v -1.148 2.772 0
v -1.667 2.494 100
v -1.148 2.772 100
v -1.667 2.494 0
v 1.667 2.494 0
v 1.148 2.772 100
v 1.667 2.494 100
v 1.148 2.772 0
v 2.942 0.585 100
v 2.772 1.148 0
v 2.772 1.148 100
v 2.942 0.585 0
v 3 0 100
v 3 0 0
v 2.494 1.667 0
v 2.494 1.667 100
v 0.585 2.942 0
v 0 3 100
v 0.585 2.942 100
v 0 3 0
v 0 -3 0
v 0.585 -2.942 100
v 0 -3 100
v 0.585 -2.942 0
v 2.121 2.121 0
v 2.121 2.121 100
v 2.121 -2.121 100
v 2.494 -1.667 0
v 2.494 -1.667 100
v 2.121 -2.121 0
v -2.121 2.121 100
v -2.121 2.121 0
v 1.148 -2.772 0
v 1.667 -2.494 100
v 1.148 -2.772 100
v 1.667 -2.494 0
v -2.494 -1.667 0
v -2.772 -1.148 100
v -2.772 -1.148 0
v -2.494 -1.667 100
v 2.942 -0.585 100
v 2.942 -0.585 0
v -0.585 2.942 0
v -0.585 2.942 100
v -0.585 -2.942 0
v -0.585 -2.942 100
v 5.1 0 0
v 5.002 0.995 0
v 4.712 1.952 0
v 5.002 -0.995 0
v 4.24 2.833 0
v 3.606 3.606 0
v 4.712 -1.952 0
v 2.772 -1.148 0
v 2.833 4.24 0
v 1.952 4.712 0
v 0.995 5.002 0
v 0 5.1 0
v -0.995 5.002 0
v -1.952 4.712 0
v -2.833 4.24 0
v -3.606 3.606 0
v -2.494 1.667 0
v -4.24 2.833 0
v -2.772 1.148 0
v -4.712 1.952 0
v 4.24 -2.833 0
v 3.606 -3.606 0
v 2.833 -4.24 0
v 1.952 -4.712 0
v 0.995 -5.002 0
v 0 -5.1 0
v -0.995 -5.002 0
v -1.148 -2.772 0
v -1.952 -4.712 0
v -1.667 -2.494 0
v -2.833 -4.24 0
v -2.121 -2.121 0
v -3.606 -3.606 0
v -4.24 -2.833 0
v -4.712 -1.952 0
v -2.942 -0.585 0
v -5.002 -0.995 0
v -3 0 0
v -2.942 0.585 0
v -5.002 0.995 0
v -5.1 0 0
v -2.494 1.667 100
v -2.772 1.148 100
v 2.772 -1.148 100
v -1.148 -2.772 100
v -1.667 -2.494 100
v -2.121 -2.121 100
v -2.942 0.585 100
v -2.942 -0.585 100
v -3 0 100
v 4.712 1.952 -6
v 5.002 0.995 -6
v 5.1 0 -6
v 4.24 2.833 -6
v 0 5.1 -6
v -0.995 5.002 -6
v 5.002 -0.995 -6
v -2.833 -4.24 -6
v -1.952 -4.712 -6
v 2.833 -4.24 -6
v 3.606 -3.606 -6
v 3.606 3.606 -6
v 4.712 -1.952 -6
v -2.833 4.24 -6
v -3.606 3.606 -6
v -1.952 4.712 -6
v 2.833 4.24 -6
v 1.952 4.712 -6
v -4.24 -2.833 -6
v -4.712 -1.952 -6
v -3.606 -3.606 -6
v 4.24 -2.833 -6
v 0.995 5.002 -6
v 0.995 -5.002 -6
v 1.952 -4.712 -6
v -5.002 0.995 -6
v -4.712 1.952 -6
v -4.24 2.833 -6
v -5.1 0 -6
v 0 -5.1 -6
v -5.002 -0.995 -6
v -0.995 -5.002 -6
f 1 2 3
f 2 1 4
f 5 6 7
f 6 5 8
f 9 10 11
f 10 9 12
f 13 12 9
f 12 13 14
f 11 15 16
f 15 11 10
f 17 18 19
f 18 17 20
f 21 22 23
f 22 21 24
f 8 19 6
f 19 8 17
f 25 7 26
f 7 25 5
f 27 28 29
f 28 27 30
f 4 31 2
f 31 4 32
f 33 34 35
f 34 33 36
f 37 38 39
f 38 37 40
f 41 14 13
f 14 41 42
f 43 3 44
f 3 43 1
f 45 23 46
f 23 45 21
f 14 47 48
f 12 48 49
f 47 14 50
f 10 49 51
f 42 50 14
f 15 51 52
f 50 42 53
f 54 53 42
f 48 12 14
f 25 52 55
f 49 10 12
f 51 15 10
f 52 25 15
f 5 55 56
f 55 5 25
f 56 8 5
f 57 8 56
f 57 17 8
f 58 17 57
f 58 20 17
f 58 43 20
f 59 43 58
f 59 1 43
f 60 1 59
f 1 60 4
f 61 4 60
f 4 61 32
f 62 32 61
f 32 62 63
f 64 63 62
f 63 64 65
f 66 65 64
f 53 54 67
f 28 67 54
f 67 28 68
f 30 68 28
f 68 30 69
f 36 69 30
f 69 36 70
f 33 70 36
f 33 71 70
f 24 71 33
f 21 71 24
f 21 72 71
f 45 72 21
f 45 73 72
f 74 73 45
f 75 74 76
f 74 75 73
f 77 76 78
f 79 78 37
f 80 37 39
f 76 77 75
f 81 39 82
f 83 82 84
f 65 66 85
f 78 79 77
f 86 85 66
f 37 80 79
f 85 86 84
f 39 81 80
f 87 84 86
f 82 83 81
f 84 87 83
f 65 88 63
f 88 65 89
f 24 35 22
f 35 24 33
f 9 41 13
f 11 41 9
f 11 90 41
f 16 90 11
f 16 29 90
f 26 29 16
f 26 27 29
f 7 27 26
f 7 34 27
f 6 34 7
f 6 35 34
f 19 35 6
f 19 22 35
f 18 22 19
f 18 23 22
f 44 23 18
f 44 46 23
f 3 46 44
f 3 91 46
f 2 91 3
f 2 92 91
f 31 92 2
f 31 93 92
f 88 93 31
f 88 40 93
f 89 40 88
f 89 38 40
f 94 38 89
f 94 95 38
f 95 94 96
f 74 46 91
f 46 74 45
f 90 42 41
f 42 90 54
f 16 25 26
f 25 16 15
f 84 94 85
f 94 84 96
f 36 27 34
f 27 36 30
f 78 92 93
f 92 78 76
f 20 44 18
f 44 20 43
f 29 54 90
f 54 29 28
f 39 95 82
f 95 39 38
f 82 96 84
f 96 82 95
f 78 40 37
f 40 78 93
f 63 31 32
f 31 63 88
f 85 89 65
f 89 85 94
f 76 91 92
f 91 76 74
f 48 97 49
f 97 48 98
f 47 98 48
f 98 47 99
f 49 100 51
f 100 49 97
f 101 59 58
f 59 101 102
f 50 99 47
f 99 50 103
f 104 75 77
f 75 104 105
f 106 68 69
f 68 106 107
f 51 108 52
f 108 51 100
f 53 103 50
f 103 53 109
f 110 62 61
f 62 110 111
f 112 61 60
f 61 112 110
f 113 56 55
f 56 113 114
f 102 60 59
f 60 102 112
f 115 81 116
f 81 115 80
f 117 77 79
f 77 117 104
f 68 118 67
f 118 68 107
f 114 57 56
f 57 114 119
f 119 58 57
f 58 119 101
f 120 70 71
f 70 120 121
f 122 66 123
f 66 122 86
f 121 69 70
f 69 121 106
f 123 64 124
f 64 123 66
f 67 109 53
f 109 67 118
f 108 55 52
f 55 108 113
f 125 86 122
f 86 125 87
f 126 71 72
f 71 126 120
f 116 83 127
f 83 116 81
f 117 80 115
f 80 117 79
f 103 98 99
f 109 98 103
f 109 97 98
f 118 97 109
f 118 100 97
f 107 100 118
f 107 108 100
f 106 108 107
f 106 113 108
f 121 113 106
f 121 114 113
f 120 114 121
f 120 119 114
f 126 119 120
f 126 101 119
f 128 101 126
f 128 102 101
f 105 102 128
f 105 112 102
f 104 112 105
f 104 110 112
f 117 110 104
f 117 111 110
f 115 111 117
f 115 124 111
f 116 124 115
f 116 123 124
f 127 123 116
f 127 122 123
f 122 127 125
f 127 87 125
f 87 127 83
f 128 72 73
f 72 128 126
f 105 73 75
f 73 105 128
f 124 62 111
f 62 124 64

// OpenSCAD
// Purchased hardware envelope; no modeled threads, not print.
$fn=32;
union(){cylinder(d=6,h=100);translate([0,0,-6])cylinder(d=10.2,h=6);}
